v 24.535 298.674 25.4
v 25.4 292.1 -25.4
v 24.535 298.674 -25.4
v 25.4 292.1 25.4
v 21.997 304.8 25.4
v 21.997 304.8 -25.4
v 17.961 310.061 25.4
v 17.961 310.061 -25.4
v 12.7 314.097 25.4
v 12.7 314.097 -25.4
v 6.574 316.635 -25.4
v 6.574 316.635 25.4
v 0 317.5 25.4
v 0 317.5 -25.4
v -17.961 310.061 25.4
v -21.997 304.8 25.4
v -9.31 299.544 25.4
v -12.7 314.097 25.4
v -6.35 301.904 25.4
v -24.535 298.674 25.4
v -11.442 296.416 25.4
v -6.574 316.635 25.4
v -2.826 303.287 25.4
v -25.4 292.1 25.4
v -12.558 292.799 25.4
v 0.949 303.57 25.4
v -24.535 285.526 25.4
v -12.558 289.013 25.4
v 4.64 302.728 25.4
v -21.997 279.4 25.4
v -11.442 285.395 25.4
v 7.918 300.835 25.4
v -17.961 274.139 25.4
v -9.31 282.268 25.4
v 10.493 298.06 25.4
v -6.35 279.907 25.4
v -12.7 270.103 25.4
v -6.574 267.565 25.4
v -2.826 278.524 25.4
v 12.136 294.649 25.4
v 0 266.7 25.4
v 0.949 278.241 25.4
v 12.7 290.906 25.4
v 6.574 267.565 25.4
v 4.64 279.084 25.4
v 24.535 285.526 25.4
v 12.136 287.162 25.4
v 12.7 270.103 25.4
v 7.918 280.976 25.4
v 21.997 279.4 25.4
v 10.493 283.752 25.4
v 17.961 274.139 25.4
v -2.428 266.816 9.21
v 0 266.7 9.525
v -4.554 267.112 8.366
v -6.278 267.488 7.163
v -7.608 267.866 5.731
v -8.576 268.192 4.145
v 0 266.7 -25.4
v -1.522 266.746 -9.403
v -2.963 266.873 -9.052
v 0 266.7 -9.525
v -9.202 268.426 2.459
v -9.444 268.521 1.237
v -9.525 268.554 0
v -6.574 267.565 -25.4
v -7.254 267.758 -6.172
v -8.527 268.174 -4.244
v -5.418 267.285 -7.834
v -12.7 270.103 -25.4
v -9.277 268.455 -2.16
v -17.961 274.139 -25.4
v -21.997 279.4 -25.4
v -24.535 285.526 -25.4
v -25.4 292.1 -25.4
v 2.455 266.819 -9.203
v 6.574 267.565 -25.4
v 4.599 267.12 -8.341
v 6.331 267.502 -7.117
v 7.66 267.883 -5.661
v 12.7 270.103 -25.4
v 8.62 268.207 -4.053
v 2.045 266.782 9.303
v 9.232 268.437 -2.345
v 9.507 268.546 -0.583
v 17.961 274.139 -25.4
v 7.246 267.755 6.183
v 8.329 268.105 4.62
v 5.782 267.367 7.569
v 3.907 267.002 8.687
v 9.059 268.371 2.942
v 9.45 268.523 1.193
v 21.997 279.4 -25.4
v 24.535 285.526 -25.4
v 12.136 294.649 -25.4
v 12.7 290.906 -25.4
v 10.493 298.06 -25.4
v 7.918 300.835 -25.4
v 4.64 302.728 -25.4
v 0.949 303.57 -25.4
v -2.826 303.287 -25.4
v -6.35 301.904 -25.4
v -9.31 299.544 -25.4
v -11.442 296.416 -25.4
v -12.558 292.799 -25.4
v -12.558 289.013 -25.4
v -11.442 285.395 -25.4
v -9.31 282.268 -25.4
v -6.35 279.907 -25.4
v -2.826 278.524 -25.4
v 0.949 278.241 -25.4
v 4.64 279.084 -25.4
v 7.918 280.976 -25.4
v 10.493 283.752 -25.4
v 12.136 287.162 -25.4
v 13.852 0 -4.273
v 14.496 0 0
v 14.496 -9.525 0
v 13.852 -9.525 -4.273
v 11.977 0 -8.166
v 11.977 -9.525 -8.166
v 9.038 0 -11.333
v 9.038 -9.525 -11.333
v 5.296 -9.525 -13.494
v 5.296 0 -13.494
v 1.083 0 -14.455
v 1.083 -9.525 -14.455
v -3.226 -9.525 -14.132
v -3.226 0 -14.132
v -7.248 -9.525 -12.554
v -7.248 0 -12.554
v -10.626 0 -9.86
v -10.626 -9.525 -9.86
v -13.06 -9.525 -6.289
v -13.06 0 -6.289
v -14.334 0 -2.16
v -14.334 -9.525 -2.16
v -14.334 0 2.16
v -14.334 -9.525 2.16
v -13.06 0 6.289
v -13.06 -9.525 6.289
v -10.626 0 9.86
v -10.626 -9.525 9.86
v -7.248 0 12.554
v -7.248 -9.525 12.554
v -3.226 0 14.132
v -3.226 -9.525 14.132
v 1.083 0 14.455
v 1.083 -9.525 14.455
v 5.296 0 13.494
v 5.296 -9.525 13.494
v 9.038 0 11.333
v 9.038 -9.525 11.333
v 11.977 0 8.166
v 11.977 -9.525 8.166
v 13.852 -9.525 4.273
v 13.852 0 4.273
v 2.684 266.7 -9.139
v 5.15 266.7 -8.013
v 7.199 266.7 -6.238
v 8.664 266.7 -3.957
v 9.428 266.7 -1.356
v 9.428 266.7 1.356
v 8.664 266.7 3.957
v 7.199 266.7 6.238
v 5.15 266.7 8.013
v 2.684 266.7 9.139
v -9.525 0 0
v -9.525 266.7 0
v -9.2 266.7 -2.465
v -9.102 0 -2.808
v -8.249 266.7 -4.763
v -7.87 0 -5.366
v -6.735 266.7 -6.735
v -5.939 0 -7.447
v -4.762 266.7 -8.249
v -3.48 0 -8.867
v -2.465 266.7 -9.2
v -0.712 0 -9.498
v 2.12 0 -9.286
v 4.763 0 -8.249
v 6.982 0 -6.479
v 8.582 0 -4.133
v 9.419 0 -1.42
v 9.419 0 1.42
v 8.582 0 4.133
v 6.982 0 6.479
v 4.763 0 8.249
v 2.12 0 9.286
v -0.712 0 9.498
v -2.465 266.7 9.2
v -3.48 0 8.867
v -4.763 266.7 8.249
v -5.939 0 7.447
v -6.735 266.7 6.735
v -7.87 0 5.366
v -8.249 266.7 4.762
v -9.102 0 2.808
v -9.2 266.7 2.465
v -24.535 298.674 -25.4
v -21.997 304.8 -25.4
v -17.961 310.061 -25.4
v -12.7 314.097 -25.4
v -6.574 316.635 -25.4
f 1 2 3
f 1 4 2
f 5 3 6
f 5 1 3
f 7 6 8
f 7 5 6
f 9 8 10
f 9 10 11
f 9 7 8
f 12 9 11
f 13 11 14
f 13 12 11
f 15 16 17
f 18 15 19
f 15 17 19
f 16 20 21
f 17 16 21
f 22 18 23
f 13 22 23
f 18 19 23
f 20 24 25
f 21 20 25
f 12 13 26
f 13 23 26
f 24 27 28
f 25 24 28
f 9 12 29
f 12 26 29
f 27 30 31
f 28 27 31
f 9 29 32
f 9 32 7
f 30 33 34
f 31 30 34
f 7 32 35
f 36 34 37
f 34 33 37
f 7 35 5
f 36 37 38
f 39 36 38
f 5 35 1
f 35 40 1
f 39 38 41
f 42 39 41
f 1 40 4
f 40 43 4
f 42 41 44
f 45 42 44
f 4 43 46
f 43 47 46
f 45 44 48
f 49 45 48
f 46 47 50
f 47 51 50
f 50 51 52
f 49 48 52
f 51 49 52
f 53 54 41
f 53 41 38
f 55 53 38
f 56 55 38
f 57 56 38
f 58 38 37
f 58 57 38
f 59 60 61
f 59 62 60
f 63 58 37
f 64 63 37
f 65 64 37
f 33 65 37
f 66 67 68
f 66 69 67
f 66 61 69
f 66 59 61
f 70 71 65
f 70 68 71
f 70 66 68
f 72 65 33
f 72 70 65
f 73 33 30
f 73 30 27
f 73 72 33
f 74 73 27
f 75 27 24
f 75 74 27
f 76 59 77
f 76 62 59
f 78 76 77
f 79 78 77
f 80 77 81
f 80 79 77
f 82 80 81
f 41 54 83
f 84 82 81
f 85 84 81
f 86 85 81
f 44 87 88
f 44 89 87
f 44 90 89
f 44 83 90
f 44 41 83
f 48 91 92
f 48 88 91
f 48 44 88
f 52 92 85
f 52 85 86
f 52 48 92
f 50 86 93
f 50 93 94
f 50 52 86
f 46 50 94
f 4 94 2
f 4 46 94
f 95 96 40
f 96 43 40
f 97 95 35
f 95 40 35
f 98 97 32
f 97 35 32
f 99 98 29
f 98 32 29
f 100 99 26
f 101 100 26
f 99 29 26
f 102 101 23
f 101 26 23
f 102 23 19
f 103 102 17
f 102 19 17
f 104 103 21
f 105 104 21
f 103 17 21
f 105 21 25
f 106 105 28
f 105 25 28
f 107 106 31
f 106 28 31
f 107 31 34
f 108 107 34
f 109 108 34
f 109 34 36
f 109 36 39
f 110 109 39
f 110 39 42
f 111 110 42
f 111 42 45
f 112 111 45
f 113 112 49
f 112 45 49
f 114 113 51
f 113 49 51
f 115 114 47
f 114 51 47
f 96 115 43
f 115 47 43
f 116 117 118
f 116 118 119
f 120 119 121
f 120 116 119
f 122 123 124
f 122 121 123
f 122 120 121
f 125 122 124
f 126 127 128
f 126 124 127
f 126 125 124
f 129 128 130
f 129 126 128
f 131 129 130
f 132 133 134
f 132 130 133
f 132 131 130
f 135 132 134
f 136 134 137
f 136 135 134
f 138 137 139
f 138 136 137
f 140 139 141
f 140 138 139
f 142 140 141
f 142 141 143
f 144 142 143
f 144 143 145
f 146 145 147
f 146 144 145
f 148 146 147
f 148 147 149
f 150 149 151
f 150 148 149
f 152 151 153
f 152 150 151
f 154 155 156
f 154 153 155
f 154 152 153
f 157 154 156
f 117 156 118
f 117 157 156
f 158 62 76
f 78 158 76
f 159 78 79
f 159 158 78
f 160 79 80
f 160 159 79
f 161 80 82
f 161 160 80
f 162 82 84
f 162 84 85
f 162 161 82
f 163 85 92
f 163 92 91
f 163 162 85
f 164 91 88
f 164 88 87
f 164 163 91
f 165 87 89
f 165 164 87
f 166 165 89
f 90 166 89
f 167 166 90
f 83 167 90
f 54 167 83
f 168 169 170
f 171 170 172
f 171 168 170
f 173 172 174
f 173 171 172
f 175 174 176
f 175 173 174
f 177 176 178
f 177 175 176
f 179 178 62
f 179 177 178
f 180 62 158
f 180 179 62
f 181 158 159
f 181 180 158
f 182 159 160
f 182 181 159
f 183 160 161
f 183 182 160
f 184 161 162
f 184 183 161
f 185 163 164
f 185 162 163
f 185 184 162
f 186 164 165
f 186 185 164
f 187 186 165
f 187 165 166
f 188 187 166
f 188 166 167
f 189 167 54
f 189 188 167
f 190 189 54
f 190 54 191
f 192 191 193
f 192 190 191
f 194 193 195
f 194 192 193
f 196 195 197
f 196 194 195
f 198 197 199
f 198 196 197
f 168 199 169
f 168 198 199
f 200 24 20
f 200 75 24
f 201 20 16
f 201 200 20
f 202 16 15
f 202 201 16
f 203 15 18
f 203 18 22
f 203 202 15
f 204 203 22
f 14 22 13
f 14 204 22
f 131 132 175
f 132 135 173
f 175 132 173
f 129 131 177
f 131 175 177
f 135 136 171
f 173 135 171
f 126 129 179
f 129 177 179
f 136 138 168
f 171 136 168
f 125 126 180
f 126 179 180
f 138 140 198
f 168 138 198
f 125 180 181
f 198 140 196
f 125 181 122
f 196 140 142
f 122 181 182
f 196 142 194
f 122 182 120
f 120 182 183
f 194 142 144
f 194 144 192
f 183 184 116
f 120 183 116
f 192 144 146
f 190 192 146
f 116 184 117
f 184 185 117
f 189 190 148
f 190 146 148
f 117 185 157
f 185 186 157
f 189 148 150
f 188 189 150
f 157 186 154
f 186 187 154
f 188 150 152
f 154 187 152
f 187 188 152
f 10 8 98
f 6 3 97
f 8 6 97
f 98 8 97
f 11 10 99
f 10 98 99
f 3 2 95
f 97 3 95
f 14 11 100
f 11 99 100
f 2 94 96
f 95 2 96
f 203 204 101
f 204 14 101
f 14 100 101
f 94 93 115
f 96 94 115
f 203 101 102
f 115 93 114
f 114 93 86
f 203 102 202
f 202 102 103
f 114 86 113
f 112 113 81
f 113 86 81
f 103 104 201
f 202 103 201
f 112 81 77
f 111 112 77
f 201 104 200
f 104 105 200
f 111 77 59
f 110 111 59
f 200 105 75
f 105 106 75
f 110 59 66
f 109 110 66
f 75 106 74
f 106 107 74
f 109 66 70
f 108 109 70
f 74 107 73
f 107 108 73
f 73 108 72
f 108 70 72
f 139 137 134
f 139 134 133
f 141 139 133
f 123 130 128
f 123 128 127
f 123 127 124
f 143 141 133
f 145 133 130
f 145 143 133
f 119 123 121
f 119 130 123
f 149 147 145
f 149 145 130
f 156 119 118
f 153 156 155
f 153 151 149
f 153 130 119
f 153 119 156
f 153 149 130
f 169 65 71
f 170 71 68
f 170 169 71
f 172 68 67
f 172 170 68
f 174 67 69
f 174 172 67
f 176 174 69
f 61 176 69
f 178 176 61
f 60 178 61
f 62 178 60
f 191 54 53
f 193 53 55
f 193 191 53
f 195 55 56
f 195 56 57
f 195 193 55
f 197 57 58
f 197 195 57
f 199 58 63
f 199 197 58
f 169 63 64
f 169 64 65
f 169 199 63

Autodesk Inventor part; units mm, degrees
ref_plane "YZ Plane" through (0, 0, 0) normal (1, 0, 0) x (0, 1, 0)
ref_plane "XZ Plane" through (0, 0, 0) normal (0, 1, 0) x (-1, 0, 0)
ref_plane "XY Plane" through (0, 0, 0) normal (0, 0, 1) x (1, 0, 0)
sketch "Sketch1" plane through (0, 0, 0) normal (0, 1, 0) x (-1, 0, 0)
  circle A0 centre (0, 0) radius 9.525
  dimension "d0" = 19.05
extrude "Extrusion1" add sketch "Sketch1" along normal blind 266.7
sketch "Sketch2" plane through (0, 266.7, 0) normal (0, 1, 0) x (1, 0, 0)
  line L0 (-25.4, -25.4) -> (25.4, -25.4)
  line L1 (25.4, -25.4) -> (25.4, 25.4)
  line L2 (25.4, 25.4) -> (-25.4, 25.4)
  line L3 (-25.4, 25.4) -> (-25.4, -25.4)
  point P0 (0, 0)
extrude "Extrusion2" add sketch "Sketch2" along normal blind 50.8
sketch "Sketch3" plane through (-25.4, 266.7, 25.4) normal (0, 0, 1) x (1, 0, 0)
  circle A0 centre (25.4, 24.2057) radius 12.7
  point P0 (25.4, -266.7)
  dimension "d6" = 25.4
fillet "Fillet1" radius 25.4 4 edges at (25.4, 317.5, 0) (-25.4, 317.5, 0) (25.4, 266.7, 0) (-25.4, 266.7, 0)
extrude "Extrusion3" cut sketch "Sketch3" against normal blind 90.4875
sketch "Sketch4" plane through (0, 0, 0) normal (0, -1, 0) x (1, 0, 0)
  circle A0 centre (0, 0) radius 14.4956
extrude "Extrusion4" add sketch "Sketch4" along normal blind 9.525
properties part number "piston" material "Aluminum 6061"
